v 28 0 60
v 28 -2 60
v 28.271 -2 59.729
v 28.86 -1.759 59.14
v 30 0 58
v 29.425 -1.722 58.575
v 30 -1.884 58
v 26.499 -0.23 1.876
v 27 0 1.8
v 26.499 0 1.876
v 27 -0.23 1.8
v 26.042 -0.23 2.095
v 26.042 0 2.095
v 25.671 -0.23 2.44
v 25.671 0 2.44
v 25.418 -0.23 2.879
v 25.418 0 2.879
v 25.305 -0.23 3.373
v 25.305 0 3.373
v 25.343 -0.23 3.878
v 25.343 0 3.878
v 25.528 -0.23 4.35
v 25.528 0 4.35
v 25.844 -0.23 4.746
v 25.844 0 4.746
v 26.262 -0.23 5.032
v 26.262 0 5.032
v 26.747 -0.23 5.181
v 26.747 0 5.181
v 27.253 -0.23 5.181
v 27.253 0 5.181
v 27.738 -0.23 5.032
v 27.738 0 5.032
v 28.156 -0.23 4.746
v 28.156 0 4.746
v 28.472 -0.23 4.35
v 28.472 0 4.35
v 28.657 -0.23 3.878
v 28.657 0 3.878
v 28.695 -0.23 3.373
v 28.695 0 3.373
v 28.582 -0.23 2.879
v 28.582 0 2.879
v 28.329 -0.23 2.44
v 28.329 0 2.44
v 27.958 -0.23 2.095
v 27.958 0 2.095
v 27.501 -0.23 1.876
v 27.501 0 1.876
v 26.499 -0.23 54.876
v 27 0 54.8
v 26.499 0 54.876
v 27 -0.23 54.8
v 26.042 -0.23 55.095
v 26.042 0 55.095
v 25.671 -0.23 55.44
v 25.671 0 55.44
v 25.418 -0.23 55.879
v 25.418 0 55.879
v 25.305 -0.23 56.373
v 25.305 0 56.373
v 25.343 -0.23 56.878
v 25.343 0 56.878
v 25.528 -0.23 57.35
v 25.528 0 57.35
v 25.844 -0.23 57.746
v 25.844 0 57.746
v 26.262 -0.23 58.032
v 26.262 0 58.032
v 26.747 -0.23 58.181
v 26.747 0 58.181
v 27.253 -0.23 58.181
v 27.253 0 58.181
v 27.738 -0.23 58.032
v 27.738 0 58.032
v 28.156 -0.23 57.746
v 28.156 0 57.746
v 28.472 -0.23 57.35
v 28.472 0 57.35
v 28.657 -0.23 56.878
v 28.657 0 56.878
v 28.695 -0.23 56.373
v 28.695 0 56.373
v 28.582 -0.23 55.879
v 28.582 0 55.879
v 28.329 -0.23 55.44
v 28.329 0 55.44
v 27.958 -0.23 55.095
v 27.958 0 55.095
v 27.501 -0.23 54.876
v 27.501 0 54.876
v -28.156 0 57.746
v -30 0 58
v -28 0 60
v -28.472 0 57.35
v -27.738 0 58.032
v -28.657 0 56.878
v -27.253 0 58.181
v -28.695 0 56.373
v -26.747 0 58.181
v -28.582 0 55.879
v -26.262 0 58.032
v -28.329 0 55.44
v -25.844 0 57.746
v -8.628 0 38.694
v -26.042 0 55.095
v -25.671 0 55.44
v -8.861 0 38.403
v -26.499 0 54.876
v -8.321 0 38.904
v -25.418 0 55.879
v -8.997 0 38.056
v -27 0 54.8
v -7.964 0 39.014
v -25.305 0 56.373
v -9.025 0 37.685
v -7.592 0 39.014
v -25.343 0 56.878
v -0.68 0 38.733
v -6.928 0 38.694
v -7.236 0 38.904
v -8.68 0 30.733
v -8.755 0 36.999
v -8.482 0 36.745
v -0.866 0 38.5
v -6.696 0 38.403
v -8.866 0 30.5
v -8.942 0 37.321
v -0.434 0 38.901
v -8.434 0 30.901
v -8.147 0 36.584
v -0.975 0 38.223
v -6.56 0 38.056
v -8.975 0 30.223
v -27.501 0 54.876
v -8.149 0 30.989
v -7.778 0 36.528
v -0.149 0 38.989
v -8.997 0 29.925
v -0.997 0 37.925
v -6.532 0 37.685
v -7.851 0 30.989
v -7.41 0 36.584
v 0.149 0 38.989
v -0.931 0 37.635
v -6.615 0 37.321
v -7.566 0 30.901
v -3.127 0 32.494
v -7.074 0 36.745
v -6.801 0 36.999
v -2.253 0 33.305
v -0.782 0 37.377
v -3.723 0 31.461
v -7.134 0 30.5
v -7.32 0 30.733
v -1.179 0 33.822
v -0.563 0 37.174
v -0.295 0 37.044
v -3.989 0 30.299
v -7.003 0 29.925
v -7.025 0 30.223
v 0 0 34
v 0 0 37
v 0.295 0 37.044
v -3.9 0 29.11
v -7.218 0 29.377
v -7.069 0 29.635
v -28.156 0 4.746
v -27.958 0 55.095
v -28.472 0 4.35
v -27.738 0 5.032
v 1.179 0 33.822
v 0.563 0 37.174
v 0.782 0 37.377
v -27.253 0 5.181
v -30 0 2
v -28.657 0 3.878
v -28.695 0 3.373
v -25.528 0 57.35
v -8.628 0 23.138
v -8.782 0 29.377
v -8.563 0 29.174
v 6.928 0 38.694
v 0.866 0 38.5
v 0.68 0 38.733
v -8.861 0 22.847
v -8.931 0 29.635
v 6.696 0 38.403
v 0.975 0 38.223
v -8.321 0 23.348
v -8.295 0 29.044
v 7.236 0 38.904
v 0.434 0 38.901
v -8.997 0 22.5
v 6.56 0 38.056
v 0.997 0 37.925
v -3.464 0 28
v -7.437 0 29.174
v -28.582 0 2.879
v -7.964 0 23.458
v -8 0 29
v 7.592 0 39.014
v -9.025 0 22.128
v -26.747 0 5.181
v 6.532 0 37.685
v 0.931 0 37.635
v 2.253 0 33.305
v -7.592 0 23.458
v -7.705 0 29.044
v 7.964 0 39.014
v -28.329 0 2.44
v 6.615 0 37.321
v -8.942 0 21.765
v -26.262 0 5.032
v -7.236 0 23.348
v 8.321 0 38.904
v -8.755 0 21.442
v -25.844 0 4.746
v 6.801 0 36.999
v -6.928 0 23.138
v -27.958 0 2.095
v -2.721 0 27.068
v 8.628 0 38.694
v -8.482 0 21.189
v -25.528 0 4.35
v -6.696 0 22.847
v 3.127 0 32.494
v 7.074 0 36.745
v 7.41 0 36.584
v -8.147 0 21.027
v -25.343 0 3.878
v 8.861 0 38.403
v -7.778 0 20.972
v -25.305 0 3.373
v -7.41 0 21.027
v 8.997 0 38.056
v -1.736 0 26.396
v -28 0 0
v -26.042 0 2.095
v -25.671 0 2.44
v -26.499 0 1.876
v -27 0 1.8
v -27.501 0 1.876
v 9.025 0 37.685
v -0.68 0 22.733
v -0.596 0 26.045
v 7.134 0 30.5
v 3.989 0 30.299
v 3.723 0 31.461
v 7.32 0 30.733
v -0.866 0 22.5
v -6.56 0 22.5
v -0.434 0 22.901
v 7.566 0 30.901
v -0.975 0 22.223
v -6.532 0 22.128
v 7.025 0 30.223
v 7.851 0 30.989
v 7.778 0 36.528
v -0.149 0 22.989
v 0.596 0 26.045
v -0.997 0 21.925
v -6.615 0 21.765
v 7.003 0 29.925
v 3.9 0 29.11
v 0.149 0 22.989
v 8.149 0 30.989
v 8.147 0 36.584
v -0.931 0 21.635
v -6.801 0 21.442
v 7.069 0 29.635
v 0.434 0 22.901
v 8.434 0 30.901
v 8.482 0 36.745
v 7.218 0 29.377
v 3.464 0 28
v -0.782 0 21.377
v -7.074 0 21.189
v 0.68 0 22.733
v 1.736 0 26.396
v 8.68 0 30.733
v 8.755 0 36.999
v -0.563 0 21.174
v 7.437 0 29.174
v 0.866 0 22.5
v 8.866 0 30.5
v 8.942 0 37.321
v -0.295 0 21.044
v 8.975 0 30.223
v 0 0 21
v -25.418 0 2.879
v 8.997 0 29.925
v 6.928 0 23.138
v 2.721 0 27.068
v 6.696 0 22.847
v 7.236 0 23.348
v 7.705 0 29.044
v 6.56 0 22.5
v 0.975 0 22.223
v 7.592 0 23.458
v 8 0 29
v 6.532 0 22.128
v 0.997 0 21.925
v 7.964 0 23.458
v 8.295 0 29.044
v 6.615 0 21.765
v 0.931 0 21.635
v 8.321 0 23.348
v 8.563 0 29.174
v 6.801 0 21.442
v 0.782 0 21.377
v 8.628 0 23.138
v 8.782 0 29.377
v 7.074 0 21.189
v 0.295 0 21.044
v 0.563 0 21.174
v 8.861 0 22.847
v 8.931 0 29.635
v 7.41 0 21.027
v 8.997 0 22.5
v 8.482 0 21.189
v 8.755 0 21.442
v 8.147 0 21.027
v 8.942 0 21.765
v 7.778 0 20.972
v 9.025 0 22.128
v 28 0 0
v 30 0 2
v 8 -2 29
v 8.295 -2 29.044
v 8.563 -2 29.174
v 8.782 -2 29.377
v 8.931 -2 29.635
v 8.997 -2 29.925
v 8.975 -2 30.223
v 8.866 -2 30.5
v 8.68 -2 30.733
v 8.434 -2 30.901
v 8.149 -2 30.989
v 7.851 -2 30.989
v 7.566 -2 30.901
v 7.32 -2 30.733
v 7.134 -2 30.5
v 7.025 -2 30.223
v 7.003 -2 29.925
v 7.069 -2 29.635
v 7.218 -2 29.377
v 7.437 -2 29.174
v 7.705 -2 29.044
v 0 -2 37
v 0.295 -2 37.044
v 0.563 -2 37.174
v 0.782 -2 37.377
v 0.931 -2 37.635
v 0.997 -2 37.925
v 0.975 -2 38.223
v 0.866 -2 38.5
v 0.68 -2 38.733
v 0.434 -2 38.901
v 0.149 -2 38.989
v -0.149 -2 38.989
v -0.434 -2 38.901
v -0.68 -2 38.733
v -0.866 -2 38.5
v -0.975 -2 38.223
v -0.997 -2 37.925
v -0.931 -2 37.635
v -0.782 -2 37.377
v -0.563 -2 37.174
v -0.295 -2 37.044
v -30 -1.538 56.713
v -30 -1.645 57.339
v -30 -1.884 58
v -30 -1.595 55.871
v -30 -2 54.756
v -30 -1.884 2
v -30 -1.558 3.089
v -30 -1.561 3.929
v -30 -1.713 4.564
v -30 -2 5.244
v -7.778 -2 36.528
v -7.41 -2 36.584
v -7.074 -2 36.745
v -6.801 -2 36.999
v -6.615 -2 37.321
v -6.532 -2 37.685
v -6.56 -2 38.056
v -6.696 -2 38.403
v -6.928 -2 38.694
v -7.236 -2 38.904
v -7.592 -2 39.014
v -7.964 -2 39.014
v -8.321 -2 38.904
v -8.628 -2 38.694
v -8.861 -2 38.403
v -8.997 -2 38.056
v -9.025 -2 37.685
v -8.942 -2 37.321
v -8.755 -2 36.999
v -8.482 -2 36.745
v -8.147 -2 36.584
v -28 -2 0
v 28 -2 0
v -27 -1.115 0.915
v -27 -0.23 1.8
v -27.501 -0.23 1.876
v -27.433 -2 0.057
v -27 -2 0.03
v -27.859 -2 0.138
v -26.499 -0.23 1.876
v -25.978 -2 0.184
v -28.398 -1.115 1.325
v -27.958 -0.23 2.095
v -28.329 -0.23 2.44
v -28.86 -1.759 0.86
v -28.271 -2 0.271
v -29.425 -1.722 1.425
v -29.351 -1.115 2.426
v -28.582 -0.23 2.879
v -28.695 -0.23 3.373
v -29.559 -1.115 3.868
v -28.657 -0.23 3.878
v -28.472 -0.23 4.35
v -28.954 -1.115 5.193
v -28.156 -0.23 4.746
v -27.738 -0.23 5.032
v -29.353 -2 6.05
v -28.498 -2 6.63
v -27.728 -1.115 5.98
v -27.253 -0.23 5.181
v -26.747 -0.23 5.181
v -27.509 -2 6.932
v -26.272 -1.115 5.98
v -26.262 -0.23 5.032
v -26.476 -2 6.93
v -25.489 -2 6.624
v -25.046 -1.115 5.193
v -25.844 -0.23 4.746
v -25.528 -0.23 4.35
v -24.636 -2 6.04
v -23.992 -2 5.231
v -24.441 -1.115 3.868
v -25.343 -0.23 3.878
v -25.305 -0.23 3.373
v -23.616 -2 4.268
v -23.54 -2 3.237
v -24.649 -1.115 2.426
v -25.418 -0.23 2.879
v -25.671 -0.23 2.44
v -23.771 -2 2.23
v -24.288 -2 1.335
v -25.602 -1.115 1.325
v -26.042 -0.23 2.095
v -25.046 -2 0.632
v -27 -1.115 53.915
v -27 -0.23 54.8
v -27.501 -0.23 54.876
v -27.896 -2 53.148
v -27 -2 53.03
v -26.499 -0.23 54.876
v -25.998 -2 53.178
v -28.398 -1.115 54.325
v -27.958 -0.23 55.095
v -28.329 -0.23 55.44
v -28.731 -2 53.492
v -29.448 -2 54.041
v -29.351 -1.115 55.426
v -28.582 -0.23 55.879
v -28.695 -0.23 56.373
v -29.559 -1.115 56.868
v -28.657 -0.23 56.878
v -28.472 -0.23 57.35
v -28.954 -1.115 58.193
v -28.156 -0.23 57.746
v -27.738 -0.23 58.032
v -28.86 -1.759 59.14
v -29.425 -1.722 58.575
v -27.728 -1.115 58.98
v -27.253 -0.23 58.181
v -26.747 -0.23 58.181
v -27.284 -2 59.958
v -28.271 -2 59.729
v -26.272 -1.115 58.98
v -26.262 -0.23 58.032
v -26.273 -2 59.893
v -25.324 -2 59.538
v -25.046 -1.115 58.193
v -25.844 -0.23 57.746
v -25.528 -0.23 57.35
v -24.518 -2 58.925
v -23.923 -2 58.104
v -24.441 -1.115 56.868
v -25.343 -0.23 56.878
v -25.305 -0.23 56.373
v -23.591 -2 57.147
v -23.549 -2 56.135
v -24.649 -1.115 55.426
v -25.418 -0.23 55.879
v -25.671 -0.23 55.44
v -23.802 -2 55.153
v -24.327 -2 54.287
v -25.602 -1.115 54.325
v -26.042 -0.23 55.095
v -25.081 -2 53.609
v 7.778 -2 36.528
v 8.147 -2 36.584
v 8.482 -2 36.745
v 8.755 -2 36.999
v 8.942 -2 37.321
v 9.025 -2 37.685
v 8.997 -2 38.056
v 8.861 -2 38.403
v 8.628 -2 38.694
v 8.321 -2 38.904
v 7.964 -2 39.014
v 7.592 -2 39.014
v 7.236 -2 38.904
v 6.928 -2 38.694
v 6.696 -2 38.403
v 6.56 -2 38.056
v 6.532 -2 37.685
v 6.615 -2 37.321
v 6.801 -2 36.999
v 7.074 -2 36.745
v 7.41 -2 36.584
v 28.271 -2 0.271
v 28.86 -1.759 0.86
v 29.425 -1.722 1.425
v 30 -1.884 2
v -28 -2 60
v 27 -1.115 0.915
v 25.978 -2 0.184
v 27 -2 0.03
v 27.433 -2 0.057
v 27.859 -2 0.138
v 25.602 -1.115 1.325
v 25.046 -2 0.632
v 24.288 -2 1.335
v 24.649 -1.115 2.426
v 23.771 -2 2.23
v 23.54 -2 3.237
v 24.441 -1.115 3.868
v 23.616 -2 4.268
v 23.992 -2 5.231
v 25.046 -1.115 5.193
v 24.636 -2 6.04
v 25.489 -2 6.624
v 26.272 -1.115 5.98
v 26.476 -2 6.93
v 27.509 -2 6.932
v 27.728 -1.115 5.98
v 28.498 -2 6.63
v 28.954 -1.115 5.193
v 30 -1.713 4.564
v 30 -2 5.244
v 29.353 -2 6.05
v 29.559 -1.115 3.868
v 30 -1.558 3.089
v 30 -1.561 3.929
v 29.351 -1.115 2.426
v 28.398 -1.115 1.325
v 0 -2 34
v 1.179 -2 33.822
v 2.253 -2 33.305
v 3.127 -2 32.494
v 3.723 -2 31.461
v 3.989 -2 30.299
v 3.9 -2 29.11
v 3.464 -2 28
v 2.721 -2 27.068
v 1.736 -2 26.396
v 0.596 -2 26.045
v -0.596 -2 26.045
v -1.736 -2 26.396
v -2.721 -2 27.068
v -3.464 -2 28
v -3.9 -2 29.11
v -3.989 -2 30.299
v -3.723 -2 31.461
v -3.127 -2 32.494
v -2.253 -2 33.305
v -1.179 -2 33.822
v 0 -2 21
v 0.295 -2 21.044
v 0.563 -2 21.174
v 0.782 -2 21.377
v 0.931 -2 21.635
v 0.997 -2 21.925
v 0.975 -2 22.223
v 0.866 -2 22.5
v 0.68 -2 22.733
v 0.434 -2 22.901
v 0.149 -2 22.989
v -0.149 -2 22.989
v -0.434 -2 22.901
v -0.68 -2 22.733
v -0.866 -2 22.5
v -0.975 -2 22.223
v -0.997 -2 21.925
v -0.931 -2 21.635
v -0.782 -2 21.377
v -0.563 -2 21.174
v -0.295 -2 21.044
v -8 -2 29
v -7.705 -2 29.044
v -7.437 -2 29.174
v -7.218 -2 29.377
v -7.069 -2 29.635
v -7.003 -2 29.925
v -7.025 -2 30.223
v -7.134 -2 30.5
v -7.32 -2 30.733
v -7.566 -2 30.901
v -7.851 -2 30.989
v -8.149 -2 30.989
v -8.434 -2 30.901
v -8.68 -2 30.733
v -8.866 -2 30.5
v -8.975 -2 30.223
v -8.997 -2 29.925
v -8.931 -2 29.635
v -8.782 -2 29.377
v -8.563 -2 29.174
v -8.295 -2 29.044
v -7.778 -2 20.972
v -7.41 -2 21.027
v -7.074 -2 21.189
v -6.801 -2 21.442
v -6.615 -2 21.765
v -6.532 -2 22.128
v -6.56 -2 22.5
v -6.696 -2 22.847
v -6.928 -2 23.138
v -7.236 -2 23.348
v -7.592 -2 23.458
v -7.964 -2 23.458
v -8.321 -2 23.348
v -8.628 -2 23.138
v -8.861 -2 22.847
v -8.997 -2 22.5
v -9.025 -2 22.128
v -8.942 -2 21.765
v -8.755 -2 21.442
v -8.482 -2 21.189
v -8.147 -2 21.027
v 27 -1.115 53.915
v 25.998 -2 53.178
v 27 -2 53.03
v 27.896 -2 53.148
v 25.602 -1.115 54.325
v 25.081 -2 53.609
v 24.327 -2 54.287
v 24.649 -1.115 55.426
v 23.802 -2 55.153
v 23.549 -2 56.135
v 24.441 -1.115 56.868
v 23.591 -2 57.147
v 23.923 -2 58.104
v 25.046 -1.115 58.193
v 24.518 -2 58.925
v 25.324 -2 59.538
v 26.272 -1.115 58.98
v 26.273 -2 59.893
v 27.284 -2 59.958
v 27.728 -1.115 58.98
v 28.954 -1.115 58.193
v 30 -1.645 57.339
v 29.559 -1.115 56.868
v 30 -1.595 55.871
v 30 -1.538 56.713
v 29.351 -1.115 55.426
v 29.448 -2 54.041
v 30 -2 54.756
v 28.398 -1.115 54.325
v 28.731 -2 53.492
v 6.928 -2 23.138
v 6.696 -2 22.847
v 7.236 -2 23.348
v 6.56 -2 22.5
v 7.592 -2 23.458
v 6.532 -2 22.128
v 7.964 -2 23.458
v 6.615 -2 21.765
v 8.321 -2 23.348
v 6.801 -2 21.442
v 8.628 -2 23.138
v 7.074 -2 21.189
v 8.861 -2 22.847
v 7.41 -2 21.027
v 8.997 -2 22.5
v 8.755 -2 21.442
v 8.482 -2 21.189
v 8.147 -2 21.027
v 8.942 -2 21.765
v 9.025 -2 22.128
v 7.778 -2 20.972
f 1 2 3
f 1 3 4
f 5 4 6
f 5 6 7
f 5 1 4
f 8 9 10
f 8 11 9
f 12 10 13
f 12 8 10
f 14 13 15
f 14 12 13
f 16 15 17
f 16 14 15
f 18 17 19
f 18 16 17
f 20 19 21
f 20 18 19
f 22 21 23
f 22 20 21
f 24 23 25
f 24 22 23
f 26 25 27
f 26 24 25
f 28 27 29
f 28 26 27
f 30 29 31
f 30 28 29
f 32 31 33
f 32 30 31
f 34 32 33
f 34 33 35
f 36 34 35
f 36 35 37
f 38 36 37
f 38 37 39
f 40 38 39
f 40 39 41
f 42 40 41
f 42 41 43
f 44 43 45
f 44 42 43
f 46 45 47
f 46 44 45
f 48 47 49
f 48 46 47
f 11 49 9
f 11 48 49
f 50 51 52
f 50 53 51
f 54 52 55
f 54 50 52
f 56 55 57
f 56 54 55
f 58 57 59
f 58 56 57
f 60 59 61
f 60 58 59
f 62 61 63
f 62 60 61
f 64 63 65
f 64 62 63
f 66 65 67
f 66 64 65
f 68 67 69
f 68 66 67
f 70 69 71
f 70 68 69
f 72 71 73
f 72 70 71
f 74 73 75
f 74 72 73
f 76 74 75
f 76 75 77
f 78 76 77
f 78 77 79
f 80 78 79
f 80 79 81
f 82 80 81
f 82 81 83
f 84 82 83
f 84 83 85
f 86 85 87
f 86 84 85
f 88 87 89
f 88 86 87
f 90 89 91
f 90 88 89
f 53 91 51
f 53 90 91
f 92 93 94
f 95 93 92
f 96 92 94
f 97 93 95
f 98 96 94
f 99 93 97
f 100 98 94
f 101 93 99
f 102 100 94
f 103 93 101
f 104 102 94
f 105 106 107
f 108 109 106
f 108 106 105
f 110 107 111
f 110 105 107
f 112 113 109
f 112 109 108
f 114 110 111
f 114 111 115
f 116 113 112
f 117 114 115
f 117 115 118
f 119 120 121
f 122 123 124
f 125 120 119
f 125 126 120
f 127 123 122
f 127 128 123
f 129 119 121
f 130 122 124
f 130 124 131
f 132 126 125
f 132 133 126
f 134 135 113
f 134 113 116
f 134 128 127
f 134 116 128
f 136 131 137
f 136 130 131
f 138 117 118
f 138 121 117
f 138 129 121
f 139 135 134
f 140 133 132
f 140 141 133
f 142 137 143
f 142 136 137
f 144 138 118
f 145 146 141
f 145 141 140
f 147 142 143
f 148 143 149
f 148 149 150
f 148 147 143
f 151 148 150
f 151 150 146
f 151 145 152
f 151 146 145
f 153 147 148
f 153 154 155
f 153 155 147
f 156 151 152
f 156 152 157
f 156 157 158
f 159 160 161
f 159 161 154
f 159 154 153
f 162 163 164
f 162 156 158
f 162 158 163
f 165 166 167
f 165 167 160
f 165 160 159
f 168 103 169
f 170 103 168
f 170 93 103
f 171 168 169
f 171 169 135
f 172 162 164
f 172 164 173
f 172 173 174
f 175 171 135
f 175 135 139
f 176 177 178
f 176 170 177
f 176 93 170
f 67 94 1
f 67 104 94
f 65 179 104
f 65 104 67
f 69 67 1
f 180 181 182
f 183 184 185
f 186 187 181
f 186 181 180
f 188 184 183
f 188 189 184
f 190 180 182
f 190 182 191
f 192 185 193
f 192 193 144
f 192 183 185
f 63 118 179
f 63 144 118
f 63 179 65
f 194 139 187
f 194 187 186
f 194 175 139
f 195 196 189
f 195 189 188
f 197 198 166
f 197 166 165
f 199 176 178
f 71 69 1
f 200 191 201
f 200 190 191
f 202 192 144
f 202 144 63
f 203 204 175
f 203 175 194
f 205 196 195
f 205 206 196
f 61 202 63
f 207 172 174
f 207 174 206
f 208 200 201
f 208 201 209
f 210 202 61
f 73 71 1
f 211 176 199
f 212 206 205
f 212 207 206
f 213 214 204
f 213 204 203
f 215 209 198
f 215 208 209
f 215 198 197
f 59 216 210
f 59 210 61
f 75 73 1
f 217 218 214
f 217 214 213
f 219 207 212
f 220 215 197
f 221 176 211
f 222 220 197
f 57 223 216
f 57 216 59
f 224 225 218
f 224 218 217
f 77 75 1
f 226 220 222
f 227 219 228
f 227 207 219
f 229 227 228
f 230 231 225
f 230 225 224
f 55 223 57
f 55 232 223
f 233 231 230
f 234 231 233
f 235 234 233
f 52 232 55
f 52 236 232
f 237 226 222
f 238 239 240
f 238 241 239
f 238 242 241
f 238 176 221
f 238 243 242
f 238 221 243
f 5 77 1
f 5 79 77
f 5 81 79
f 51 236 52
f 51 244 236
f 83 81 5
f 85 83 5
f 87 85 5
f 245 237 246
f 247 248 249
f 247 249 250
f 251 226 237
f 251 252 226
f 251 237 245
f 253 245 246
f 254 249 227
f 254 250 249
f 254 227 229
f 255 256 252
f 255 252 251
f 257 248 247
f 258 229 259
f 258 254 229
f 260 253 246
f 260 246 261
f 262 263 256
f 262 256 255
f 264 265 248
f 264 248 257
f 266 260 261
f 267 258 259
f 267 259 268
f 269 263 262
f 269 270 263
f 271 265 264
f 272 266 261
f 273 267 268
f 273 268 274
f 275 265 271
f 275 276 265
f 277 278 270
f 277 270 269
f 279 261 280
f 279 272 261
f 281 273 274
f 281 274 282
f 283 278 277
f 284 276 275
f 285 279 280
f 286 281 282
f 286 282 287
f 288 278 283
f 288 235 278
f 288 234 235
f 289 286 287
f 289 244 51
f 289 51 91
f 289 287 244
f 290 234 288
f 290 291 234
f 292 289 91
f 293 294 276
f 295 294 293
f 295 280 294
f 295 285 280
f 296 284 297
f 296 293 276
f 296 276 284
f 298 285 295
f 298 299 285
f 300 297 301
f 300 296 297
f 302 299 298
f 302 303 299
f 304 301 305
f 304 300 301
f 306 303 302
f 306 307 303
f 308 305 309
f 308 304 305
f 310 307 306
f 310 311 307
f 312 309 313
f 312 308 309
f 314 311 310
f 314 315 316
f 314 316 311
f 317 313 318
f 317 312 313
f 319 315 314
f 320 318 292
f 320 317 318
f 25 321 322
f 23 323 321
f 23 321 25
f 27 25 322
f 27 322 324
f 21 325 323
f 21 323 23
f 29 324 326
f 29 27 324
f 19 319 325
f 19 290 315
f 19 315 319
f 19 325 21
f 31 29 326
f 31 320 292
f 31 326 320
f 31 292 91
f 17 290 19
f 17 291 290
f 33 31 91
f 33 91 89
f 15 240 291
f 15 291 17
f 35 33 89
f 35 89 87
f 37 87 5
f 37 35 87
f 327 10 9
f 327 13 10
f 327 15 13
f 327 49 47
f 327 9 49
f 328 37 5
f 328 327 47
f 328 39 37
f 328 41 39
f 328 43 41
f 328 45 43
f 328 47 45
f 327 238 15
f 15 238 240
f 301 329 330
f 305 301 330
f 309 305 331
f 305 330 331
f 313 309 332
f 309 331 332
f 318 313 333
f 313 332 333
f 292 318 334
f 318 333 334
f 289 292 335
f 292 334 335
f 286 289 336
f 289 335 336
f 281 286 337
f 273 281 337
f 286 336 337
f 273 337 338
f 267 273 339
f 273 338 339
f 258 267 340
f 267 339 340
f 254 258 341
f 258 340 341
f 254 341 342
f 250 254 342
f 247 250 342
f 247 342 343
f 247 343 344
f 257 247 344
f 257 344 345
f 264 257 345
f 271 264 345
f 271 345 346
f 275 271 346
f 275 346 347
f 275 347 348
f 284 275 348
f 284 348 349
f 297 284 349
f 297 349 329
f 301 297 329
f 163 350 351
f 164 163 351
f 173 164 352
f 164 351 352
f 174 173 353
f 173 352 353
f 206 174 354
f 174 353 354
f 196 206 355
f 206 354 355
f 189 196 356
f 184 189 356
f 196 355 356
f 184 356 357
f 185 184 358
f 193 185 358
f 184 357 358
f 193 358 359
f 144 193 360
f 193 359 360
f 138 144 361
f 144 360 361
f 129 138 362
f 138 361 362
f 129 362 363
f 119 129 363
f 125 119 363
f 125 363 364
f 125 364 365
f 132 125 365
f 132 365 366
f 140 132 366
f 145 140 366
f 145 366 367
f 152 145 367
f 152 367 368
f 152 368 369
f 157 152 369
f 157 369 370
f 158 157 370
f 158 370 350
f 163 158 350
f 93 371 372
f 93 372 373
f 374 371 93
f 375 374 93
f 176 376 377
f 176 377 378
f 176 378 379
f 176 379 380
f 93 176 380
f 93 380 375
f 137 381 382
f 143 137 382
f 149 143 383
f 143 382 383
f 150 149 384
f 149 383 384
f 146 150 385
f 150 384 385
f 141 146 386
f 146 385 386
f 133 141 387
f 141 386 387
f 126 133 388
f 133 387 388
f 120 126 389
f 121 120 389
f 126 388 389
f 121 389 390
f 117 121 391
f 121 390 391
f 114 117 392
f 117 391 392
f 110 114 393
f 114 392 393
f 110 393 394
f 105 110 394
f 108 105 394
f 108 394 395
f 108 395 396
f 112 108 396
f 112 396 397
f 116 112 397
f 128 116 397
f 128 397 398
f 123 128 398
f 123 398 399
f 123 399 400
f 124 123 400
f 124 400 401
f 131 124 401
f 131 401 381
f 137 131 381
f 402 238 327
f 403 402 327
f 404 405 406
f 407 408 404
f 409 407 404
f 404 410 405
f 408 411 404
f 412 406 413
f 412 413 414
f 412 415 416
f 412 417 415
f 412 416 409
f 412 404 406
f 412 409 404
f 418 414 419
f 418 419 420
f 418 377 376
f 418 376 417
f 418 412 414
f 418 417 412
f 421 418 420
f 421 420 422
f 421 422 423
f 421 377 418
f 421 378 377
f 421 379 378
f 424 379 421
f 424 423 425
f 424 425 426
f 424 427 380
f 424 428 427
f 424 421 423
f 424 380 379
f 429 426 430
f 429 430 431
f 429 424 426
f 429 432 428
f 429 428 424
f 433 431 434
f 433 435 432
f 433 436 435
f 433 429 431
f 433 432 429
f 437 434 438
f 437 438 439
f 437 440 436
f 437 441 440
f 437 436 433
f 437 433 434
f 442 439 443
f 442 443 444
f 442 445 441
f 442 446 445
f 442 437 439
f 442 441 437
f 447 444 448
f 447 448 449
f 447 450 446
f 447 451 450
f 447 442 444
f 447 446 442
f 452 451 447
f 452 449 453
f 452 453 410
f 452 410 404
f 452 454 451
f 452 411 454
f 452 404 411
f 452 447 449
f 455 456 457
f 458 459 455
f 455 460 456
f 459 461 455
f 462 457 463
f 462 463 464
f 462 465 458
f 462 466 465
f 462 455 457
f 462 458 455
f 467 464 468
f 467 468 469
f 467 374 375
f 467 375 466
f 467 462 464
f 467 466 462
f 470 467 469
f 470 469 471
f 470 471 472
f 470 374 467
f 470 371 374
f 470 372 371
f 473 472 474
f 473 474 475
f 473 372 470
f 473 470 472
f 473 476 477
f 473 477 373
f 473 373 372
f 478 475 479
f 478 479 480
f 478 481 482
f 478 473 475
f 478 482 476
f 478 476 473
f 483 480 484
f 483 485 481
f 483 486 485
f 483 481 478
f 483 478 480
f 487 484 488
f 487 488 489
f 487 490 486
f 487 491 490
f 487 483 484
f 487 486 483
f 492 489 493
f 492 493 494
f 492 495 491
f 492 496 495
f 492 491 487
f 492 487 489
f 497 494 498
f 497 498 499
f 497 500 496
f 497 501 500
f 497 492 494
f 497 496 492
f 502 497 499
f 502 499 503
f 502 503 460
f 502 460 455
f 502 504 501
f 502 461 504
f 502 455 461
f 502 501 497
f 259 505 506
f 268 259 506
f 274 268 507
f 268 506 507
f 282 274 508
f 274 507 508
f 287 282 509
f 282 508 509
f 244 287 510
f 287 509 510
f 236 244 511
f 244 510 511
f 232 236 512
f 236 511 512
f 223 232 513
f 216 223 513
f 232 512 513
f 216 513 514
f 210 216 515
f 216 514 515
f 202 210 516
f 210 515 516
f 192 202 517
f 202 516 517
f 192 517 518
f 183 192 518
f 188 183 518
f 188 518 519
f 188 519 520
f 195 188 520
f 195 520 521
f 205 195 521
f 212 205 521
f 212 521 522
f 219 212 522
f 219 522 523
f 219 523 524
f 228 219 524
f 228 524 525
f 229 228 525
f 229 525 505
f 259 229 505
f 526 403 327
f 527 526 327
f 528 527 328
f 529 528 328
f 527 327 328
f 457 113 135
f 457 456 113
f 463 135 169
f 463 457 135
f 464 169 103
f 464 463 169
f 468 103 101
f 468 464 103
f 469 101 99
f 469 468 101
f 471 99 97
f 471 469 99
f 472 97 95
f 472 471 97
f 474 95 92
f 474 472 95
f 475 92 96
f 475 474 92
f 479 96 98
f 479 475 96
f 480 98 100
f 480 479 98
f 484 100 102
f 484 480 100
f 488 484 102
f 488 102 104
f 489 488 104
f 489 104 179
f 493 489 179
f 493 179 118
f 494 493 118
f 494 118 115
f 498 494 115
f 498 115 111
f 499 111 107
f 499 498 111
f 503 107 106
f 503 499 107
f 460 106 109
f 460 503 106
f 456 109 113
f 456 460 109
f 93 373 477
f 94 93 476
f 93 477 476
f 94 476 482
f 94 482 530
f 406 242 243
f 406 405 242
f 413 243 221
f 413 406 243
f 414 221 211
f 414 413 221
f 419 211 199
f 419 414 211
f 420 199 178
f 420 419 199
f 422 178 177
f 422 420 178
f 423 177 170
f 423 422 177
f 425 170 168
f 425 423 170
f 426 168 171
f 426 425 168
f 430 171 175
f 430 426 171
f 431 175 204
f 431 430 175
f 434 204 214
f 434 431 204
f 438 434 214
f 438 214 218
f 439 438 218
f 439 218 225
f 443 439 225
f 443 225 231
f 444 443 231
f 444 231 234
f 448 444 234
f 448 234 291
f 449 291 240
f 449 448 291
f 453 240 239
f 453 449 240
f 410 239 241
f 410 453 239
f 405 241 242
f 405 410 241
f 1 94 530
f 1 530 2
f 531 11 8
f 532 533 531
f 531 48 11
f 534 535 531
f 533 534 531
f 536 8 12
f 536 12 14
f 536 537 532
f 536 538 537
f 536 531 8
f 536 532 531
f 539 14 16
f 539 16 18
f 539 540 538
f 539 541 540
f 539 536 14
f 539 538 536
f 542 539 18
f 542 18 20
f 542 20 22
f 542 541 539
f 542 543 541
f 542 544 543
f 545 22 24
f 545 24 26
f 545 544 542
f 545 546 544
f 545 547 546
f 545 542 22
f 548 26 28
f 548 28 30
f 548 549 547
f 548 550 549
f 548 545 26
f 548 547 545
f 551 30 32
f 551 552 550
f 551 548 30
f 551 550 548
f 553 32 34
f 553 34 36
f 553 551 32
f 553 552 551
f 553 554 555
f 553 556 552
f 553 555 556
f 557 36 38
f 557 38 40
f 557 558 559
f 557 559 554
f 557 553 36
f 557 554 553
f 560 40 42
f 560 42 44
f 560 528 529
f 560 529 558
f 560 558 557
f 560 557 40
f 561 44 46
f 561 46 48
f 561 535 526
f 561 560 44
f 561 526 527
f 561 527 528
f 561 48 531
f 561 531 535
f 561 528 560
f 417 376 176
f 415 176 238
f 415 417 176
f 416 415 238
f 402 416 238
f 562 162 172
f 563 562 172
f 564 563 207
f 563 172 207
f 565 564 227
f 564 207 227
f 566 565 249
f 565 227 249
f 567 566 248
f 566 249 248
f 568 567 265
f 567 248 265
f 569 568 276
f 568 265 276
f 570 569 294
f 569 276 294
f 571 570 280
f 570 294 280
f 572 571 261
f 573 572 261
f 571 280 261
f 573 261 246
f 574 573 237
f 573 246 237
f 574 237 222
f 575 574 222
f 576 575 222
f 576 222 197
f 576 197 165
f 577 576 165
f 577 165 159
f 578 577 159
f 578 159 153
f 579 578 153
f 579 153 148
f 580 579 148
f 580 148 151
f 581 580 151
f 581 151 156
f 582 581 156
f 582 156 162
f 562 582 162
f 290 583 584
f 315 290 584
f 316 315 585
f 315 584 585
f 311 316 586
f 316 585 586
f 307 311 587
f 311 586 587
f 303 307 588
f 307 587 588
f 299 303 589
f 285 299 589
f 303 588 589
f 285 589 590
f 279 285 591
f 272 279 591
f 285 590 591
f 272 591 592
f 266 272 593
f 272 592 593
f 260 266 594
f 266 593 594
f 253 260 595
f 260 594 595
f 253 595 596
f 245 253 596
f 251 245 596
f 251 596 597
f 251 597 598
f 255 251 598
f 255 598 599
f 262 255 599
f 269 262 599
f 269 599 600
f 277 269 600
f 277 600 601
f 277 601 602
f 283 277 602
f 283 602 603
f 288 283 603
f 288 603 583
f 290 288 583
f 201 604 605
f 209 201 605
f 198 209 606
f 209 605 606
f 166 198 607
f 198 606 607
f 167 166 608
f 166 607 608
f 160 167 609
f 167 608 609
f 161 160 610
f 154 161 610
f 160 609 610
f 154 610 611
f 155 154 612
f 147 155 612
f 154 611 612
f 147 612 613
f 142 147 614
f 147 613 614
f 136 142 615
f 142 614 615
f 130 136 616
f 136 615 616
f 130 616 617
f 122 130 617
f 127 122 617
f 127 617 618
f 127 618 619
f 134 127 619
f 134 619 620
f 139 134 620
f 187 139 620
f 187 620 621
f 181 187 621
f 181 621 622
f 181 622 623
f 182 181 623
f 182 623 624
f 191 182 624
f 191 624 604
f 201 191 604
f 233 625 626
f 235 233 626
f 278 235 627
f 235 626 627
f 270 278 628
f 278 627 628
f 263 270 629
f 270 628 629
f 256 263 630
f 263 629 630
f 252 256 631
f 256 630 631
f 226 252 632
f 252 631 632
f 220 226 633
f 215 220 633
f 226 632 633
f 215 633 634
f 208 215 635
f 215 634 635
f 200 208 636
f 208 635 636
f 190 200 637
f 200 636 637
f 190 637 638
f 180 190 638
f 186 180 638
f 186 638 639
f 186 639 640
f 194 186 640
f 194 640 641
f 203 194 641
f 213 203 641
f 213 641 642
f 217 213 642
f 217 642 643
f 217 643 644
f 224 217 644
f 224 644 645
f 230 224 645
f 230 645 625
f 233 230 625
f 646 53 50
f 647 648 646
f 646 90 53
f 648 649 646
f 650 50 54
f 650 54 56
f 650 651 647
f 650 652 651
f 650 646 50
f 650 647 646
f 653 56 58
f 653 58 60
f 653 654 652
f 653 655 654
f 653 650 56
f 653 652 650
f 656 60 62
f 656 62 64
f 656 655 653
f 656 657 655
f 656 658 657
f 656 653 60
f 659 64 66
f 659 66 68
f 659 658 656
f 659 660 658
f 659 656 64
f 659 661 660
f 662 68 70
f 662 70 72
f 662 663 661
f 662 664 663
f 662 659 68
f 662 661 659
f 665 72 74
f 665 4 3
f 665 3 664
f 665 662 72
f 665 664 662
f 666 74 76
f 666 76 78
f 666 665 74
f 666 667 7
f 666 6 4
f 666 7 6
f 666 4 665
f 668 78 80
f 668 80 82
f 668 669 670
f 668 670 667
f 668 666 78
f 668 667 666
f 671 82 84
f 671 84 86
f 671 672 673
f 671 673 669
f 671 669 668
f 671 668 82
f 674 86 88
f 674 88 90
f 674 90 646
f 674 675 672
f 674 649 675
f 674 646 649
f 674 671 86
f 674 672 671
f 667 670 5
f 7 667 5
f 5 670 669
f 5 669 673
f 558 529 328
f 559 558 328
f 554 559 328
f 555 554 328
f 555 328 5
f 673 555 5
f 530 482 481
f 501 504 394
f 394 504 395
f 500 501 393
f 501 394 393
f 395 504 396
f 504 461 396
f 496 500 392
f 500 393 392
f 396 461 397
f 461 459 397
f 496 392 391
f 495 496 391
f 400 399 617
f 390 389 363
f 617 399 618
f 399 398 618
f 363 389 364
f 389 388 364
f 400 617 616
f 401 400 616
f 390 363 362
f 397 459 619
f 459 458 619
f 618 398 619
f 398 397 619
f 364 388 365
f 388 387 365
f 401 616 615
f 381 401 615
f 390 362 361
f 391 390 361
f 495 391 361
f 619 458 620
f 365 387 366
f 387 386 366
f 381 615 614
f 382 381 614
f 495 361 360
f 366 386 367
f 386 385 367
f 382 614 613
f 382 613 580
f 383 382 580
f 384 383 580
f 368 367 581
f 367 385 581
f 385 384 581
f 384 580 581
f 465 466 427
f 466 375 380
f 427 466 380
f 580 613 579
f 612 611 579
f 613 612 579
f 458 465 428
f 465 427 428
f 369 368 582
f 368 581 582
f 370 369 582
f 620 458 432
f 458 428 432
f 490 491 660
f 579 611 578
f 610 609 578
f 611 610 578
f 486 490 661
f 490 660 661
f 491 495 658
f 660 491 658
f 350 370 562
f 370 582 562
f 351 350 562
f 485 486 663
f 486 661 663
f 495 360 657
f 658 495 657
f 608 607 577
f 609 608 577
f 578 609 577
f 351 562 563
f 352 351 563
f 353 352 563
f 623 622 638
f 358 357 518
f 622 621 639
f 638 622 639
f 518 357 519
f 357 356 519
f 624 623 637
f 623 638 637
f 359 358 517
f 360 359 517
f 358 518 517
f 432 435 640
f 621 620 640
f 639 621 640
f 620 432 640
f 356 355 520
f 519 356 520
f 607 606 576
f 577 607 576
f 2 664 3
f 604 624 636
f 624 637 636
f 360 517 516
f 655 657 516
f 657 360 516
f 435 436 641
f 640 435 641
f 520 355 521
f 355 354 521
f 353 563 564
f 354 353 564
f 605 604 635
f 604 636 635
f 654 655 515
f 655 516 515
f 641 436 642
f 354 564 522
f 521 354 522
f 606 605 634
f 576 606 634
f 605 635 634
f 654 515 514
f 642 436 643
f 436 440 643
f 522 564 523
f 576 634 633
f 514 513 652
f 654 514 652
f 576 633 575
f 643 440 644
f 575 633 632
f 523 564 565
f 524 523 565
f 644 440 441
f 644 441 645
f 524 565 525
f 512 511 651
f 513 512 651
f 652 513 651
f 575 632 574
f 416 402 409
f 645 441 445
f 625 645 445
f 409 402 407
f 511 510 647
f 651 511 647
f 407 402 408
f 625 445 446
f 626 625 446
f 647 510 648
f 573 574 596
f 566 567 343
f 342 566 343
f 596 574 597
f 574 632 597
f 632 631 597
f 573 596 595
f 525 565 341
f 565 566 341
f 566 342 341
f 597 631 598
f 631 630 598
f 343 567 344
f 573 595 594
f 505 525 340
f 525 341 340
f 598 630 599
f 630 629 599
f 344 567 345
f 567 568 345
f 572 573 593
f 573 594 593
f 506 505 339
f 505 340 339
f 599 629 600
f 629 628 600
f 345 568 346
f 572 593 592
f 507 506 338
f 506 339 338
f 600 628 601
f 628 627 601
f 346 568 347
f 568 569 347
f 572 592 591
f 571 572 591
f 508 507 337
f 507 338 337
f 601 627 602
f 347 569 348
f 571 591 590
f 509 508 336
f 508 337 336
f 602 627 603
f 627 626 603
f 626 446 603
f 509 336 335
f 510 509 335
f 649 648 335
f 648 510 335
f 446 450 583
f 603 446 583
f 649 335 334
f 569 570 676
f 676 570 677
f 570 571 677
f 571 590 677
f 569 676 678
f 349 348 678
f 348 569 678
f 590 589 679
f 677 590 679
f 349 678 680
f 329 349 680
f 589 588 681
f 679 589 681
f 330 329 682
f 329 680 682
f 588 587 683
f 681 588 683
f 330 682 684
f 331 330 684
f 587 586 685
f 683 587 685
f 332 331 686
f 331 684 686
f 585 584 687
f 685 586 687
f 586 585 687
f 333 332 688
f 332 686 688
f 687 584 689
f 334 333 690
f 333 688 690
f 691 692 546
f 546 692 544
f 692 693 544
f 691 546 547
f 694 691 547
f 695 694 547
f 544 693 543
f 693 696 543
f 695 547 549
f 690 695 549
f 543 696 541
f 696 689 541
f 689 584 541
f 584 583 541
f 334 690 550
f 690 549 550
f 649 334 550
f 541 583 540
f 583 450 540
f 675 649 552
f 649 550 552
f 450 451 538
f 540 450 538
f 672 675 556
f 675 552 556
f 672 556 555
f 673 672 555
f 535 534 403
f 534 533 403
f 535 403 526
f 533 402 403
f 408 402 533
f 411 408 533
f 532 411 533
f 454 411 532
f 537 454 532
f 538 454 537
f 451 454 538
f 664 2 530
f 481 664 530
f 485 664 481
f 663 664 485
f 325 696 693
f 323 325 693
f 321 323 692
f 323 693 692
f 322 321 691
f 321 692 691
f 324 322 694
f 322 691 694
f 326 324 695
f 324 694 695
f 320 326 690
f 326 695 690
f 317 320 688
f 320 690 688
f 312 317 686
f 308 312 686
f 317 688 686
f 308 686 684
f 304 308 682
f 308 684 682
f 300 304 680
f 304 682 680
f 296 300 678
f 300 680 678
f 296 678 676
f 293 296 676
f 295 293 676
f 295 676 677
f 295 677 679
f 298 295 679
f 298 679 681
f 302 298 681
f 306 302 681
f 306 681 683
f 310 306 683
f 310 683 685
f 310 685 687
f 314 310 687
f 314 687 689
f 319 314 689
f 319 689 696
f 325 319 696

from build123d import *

# Parameters (mm, degrees)
SKETCH1_W                                    = 60
SKETCH1_H                                    = 2
BASE_FLANGE1_DEPTH                           = 60
SKETCH2_R                                    = 1.25
CUT_EXTRUDE1_DEPTH                           = 10
CSK_FOR_M3_HEX_SOCKET_COUNTERSUNK_HE_2_COUNT = 2
CSK_FOR_M3_HEX_SOCKET_COUNTERSUNK_HE_2_PITCH = 54
CSK_FOR_M3_HEX_SOCKET_COUNTERSUNK_HE_3_COUNT = 2
CSK_FOR_M3_HEX_SOCKET_COUNTERSUNK_HE_3_PITCH = 53
CSK_FOR_M3_HEX_SOCKET_COUNTERSUNK_HE_4_COUNT = 2
CSK_FOR_M3_HEX_SOCKET_COUNTERSUNK_HE_4_PITCH = 75.663729752
CUT_EXTRUDE2_REACH                           = 69.112
SKETCH4_R                                    = 4
CHAMFER1_SIZE                                = 2
CUT_EXTRUDE3_REACH                           = 69.112
SKETCH5_R                                    = 1.25
SKETCH5_R_2                                  = 1


# Sheet-metal steps are written as plain solids
with BuildPart() as part:
    # Sketch1 → Base-Flange1 (new body)
    with BuildSketch(Plane.XY):
        with Locations((0, -1)):
            Rectangle(SKETCH1_W, SKETCH1_H)
    extrude(amount=BASE_FLANGE1_DEPTH)

    # Sketch2 → Cut-Extrude1 (cut)
    with BuildSketch(Plane(origin=(0, 0, 0), x_dir=(1, 0, 0), z_dir=(0, 1, 0))):
        with Locations(Location((-27, -3.5, 0), (0, 0, 270))):
            Circle(SKETCH2_R)
        with Locations(Location((-27, -56.5, 0), (0, 0, 270))):
            Circle(SKETCH2_R)
        with Locations(Location((27, -56.5, 0), (0, 0, 270))):
            Circle(SKETCH2_R)
        with Locations(Location((27, -3.5, 0), (0, 0, 270))):
            Circle(SKETCH2_R)
    extrude(amount=-CUT_EXTRUDE1_DEPTH, mode=Mode.SUBTRACT)

    # Sketch3 → CSK for M3 Hex Socket Countersunk Head Screw1 (revolve, cut)
    with BuildSketch(Plane(origin=(27, -2, 3.5), x_dir=(0, 0, -1), z_dir=(1, 0, 0))):
        Polygon((0, 0), (0, 2), (1.7, 2), (1.7, 1.77), (3.47, 0), align=None)
    csk_for_m3_hex_socket_countersunk_head_s = revolve(axis=Axis((27, -8.35, 3.5), (0, 1, 0)), mode=Mode.SUBTRACT)

    # CSK for M3 Hex Socket Countersunk He 2: CSK for M3 Hex Socket Countersunk Head Screw1 ×2
    with Locations(*[(-i * CSK_FOR_M3_HEX_SOCKET_COUNTERSUNK_HE_2_PITCH, 0, 0) for i in range(1, CSK_FOR_M3_HEX_SOCKET_COUNTERSUNK_HE_2_COUNT)]):
        add(csk_for_m3_hex_socket_countersunk_head_s, mode=Mode.SUBTRACT)

    # CSK for M3 Hex Socket Countersunk He 3: CSK for M3 Hex Socket Countersunk Head Screw1 ×2
    with Locations(*[(0, 0, i * CSK_FOR_M3_HEX_SOCKET_COUNTERSUNK_HE_3_PITCH) for i in range(1, CSK_FOR_M3_HEX_SOCKET_COUNTERSUNK_HE_3_COUNT)]):
        add(csk_for_m3_hex_socket_countersunk_head_s, mode=Mode.SUBTRACT)

    # CSK for M3 Hex Socket Countersunk He 4: CSK for M3 Hex Socket Countersunk Head Screw1 ×2
    with Locations(*[Vector(-0.7136840884914971, 0, 0.7004677164823951) * (i * CSK_FOR_M3_HEX_SOCKET_COUNTERSUNK_HE_4_PITCH) for i in range(1, CSK_FOR_M3_HEX_SOCKET_COUNTERSUNK_HE_4_COUNT)]):
        add(csk_for_m3_hex_socket_countersunk_head_s, mode=Mode.SUBTRACT)

    # Sketch4 → Cut-Extrude2 (cut, up to next)
    with BuildSketch(Plane(origin=(0, 0, 0), x_dir=(1, 0, 0), z_dir=(0, 1, 0)), mode=Mode.PRIVATE) as cut_extrude2_sk1:
        with Locations(Location((0, -30, 0), (0, 0, 270))):
            Circle(SKETCH4_R)
    cut_extrude2_tool1 = extrude(cut_extrude2_sk1.sketch, amount=-CUT_EXTRUDE2_REACH, mode=Mode.PRIVATE) & part.part
    add(cut_extrude2_tool1.solids().sort_by_distance((0, 0, 30))[0], mode=Mode.SUBTRACT)

    # Chamfer1
    # the kernel refuses this chamfer: 2 mm, written as the material it takes off along each edge
    with BuildSketch(Plane(origin=(30, 5.143365976, 0), x_dir=(-0.9996219169112968, 0, -0.02749587661058639), z_dir=(0, -1, 0)), Plane(origin=(-30, -7.143365976, 60), x_dir=(-0.027495876610585647, 0, -0.9996219169112968), z_dir=(0, 1, 0))) as chamfer1_piece_1:
        Polygon((CHAMFER1_SIZE * 0.999621916911, -CHAMFER1_SIZE * 0.0274958766106), (-CHAMFER1_SIZE * 0.0274958766106, -CHAMFER1_SIZE * 0.999621916911), (0, 0), align=None)
    extrude(amount=12.286731952, mode=Mode.SUBTRACT)
    with BuildSketch(Plane(origin=(30, 5.143365976, 60), x_dir=(-0.9996219169112968, 0, 0.027495876610585647), z_dir=(0, -1, 0)), Plane(origin=(-30, -7.143365976, 0), x_dir=(-0.02749587661058563, 0, 0.9996219169112968), z_dir=(0, 1, 0))) as chamfer1_piece_2:
        Polygon((CHAMFER1_SIZE * 0.999621916911, CHAMFER1_SIZE * 0.0274958766106), (-CHAMFER1_SIZE * 0.0274958766106, CHAMFER1_SIZE * 0.999621916911), (0, 0), align=None)
    extrude(amount=12.286731952, mode=Mode.SUBTRACT)

    # Sketch5 → Cut-Extrude3 (cut, up to next)
    with BuildSketch(Plane.XZ.offset(2), mode=Mode.PRIVATE) as cut_extrude3_sk1:
        with Locations(Location((7.778174593, 37.778174593, 0), (0, 0, 270))):
            Circle(SKETCH5_R)
    cut_extrude3_tool1 = extrude(cut_extrude3_sk1.sketch, amount=-CUT_EXTRUDE3_REACH, mode=Mode.PRIVATE) & part.part
    # Sketch5 → Cut-Extrude3 (cut, up to next)
    with BuildSketch(Plane.XZ.offset(2), mode=Mode.PRIVATE) as cut_extrude3_sk2:
        with Locations(Location((-7.778174593, 37.778174593, 0), (0, 0, 270))):
            Circle(SKETCH5_R)
    cut_extrude3_tool2 = extrude(cut_extrude3_sk2.sketch, amount=-CUT_EXTRUDE3_REACH, mode=Mode.PRIVATE) & part.part
    # Sketch5 → Cut-Extrude3 (cut, up to next)
    with BuildSketch(Plane.XZ.offset(2), mode=Mode.PRIVATE) as cut_extrude3_sk3:
        with Locations(Location((-7.778174593, 22.221825407, 0), (0, 0, 270))):
            Circle(SKETCH5_R)
    cut_extrude3_tool3 = extrude(cut_extrude3_sk3.sketch, amount=-CUT_EXTRUDE3_REACH, mode=Mode.PRIVATE) & part.part
    # Sketch5 → Cut-Extrude3 (cut, up to next)
    with BuildSketch(Plane.XZ.offset(2), mode=Mode.PRIVATE) as cut_extrude3_sk4:
        with Locations(Location((7.778174593, 22.221825407, 0), (0, 0, 270))):
            Circle(SKETCH5_R)
    cut_extrude3_tool4 = extrude(cut_extrude3_sk4.sketch, amount=-CUT_EXTRUDE3_REACH, mode=Mode.PRIVATE) & part.part
    # Sketch5 → Cut-Extrude3 (cut, up to next)
    with BuildSketch(Plane.XZ.offset(2), mode=Mode.PRIVATE) as cut_extrude3_sk5:
        with Locations(Location((8, 30, 0), (0, 0, 270))):
            Circle(SKETCH5_R_2)
    cut_extrude3_tool5 = extrude(cut_extrude3_sk5.sketch, amount=-CUT_EXTRUDE3_REACH, mode=Mode.PRIVATE) & part.part
    # Sketch5 → Cut-Extrude3 (cut, up to next)
    with BuildSketch(Plane.XZ.offset(2), mode=Mode.PRIVATE) as cut_extrude3_sk6:
        with Locations(Location((0, 22, 0), (0, 0, 270))):
            Circle(SKETCH5_R_2)
    cut_extrude3_tool6 = extrude(cut_extrude3_sk6.sketch, amount=-CUT_EXTRUDE3_REACH, mode=Mode.PRIVATE) & part.part
    # Sketch5 → Cut-Extrude3 (cut, up to next)
    with BuildSketch(Plane.XZ.offset(2), mode=Mode.PRIVATE) as cut_extrude3_sk7:
        with Locations(Location((-8, 30, 0), (0, 0, 270))):
            Circle(SKETCH5_R_2)
    cut_extrude3_tool7 = extrude(cut_extrude3_sk7.sketch, amount=-CUT_EXTRUDE3_REACH, mode=Mode.PRIVATE) & part.part
    # Sketch5 → Cut-Extrude3 (cut, up to next)
    with BuildSketch(Plane.XZ.offset(2), mode=Mode.PRIVATE) as cut_extrude3_sk8:
        with Locations(Location((0, 38, 0), (0, 0, 270))):
            Circle(SKETCH5_R_2)
    cut_extrude3_tool8 = extrude(cut_extrude3_sk8.sketch, amount=-CUT_EXTRUDE3_REACH, mode=Mode.PRIVATE) & part.part
    add(cut_extrude3_tool1.solids().sort_by_distance((7.778175, -2, 37.778175))[0], mode=Mode.SUBTRACT)
    add(cut_extrude3_tool2.solids().sort_by_distance((-7.778175, -2, 37.778175))[0], mode=Mode.SUBTRACT)
    add(cut_extrude3_tool3.solids().sort_by_distance((-7.778175, -2, 22.221825))[0], mode=Mode.SUBTRACT)
    add(cut_extrude3_tool4.solids().sort_by_distance((7.778175, -2, 22.221825))[0], mode=Mode.SUBTRACT)
    add(cut_extrude3_tool5.solids().sort_by_distance((8, -2, 30))[0], mode=Mode.SUBTRACT)
    add(cut_extrude3_tool6.solids().sort_by_distance((0, -2, 22))[0], mode=Mode.SUBTRACT)
    add(cut_extrude3_tool7.solids().sort_by_distance((-8, -2, 30))[0], mode=Mode.SUBTRACT)
    add(cut_extrude3_tool8.solids().sort_by_distance((0, -2, 38))[0], mode=Mode.SUBTRACT)


solid = part.part
